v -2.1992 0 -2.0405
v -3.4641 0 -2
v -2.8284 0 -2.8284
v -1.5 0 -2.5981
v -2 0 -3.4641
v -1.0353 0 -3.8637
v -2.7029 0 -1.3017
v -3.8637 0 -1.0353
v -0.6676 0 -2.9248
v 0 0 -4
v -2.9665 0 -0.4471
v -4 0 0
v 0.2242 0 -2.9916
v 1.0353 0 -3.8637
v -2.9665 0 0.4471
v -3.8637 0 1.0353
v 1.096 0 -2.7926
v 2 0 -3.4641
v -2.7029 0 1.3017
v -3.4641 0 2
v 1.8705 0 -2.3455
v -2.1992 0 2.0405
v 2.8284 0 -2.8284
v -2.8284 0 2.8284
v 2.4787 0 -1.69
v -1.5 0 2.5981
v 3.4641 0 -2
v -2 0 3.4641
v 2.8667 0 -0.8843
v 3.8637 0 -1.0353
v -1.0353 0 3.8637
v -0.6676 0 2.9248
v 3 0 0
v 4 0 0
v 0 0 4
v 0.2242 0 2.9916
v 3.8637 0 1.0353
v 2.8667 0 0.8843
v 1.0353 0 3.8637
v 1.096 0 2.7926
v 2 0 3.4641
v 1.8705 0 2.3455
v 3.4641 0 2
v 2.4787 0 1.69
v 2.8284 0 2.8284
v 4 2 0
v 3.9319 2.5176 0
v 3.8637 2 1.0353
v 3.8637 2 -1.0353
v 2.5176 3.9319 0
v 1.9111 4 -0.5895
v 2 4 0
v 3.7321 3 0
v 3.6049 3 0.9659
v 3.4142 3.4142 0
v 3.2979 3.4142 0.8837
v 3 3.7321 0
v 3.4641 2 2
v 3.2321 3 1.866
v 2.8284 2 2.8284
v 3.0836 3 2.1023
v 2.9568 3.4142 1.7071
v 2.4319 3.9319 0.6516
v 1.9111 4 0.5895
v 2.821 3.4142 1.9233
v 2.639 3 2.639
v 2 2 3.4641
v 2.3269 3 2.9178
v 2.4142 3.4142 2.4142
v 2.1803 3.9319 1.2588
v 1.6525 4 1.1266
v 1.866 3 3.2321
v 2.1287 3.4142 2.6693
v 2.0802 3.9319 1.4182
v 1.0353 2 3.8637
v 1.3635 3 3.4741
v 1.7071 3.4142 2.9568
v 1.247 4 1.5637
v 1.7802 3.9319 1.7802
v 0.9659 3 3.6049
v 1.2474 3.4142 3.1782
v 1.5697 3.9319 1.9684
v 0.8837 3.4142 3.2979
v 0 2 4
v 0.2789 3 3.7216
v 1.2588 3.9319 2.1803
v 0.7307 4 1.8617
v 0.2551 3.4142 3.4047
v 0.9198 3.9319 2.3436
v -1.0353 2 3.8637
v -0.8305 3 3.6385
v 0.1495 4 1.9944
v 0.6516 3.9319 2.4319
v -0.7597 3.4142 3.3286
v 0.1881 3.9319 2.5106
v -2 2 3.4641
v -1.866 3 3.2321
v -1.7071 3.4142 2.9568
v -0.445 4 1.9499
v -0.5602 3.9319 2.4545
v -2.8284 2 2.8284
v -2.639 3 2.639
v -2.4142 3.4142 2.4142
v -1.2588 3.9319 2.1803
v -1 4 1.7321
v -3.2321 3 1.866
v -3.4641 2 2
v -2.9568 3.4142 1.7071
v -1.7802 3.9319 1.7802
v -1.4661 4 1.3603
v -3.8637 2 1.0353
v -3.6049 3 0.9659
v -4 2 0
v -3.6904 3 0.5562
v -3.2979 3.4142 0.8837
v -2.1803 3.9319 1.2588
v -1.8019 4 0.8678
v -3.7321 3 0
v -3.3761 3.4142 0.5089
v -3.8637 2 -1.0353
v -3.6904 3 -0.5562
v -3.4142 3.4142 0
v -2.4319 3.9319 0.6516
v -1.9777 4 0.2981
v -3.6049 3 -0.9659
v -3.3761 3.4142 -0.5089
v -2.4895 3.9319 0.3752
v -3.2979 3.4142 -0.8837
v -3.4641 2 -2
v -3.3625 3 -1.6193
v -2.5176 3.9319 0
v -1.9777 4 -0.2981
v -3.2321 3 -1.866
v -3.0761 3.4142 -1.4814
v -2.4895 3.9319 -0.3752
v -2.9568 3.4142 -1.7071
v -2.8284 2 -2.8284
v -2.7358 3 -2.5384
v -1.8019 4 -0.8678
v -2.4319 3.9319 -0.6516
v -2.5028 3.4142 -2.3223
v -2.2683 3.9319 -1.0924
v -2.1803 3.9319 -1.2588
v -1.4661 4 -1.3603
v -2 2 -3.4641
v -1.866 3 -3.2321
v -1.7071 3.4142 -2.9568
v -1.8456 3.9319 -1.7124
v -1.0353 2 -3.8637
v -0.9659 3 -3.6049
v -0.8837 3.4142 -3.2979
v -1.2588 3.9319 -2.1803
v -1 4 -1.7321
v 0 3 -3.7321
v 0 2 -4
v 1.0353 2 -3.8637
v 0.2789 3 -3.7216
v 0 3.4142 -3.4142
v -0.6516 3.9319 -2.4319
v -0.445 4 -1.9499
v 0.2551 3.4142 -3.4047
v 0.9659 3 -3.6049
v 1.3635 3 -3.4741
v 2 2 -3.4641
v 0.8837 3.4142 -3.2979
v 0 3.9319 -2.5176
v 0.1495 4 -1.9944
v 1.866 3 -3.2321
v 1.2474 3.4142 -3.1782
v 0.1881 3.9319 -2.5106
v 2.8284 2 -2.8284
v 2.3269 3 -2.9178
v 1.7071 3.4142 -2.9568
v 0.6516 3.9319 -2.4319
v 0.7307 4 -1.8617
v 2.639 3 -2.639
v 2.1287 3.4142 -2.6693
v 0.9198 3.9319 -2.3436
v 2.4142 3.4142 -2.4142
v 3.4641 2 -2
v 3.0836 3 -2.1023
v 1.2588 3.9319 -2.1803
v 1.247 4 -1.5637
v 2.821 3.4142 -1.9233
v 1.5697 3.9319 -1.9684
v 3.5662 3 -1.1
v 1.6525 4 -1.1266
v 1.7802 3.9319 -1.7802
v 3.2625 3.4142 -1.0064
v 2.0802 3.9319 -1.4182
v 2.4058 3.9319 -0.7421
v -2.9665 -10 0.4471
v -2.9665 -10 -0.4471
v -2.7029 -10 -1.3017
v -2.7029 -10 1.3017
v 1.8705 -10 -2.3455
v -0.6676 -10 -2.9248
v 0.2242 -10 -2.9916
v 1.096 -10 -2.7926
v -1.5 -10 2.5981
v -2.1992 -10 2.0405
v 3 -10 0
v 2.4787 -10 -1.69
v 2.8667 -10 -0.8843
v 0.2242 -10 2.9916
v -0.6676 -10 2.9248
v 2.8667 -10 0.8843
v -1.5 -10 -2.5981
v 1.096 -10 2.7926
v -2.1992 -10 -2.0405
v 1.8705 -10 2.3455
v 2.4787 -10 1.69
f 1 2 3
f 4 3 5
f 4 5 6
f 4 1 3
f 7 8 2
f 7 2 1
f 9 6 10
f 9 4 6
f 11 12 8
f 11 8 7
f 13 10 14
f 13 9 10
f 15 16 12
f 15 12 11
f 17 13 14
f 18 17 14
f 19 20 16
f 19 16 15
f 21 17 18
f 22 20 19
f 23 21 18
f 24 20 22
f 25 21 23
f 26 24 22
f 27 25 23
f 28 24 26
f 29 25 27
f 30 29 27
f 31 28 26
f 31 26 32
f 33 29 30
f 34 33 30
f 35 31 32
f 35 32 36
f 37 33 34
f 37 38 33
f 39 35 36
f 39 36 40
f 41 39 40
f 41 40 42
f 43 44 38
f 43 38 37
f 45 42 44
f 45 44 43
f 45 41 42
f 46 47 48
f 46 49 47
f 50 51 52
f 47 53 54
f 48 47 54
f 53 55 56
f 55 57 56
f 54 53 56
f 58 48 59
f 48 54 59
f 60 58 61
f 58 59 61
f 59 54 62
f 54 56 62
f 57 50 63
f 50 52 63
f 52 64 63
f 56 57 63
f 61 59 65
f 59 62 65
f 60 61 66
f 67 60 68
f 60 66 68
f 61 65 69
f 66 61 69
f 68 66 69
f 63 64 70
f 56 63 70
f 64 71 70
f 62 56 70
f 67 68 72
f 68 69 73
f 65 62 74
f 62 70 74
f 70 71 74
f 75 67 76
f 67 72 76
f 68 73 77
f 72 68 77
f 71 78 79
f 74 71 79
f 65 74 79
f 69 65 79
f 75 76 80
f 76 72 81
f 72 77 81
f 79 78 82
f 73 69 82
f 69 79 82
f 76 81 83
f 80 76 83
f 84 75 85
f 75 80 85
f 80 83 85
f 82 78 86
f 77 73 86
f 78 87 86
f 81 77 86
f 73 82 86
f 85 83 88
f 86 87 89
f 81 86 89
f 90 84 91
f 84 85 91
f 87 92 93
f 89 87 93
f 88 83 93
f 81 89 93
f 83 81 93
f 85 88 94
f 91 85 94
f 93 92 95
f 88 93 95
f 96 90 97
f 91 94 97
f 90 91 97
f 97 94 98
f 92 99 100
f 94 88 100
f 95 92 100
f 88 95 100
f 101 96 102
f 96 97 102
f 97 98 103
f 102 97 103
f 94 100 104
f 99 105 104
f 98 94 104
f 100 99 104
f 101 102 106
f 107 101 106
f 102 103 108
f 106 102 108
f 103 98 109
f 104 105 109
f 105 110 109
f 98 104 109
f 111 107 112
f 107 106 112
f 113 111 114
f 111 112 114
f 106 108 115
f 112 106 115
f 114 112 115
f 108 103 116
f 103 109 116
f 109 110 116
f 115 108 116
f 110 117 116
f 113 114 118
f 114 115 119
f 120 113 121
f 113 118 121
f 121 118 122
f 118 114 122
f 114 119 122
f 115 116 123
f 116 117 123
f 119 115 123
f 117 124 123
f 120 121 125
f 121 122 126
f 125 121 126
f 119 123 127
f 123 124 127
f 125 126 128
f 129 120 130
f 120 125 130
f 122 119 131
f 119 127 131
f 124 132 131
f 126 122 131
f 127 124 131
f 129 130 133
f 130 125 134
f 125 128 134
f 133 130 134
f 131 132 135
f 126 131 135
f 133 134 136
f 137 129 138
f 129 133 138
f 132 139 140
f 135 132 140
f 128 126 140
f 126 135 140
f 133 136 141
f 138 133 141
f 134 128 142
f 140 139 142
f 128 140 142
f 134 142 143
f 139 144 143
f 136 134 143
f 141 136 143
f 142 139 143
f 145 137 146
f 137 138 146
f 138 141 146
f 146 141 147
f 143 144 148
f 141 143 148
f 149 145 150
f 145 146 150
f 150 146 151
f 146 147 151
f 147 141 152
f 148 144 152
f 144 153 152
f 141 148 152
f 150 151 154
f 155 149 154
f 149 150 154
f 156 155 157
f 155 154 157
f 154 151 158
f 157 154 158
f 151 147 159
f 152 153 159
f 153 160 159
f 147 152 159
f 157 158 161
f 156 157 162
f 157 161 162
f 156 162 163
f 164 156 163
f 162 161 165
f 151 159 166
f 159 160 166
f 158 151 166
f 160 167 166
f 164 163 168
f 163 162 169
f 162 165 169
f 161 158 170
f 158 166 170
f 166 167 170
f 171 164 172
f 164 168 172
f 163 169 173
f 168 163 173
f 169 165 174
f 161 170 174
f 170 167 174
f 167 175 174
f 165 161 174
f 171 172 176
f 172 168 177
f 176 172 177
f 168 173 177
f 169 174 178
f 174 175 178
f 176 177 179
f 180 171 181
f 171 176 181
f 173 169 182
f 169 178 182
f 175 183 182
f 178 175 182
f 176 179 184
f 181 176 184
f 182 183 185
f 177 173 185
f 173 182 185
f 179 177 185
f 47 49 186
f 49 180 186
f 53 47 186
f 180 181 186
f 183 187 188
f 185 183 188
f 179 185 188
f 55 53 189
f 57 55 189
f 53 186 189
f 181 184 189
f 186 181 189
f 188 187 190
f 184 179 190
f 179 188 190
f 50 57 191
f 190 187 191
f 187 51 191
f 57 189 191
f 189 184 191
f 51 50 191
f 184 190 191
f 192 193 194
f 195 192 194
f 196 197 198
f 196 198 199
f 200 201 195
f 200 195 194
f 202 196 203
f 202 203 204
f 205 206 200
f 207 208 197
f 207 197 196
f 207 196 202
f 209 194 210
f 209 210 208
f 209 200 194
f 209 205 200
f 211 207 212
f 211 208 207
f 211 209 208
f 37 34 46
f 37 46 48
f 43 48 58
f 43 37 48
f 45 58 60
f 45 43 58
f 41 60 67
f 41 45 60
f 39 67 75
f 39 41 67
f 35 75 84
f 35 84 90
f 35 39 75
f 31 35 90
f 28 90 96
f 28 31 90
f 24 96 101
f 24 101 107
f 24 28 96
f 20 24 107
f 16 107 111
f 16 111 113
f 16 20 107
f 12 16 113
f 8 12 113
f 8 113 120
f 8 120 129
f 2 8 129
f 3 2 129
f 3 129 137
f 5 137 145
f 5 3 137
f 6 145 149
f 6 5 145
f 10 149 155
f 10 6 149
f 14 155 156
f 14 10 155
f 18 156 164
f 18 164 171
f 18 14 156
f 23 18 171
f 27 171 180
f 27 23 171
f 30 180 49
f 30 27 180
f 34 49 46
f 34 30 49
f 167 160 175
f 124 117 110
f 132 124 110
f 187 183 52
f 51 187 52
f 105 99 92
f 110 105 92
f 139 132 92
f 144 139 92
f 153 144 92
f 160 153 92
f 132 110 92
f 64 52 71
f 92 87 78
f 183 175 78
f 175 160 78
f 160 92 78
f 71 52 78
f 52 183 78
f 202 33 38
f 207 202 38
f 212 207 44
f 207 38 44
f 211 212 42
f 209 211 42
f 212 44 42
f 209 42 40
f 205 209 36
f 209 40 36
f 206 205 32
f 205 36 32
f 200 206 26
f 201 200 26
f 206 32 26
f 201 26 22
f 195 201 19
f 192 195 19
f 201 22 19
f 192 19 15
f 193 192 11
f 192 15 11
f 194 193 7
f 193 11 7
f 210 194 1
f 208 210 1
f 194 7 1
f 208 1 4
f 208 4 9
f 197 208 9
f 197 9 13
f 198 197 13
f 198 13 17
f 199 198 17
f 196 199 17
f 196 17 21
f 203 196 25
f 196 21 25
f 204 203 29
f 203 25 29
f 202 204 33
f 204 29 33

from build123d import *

# Parameters (mm, degrees)
F0_R     = 3
F1_DEPTH = 10
F0_R_2   = 4
F2_DEPTH = 4
F3_R     = 2


with BuildPart() as f1:
    # F0 (on Front) → F1 (new body)
    with BuildSketch(Plane.XZ):
        Circle(F0_R)
    extrude(amount=F1_DEPTH)

    # F0 (on Front) → F2 (join)
    with BuildSketch(Plane.XZ):
        Circle(F0_R_2)
        Circle(F0_R, mode=Mode.SUBTRACT)
        Circle(F0_R)
    extrude(amount=-F2_DEPTH)

    # F3
    f3_edges = [f1.edges().sort_by_distance(p)[0] for p in [
        (-4, 4, 0),
    ]]
    fillet(f3_edges, radius=F3_R)


solid = f1.part
